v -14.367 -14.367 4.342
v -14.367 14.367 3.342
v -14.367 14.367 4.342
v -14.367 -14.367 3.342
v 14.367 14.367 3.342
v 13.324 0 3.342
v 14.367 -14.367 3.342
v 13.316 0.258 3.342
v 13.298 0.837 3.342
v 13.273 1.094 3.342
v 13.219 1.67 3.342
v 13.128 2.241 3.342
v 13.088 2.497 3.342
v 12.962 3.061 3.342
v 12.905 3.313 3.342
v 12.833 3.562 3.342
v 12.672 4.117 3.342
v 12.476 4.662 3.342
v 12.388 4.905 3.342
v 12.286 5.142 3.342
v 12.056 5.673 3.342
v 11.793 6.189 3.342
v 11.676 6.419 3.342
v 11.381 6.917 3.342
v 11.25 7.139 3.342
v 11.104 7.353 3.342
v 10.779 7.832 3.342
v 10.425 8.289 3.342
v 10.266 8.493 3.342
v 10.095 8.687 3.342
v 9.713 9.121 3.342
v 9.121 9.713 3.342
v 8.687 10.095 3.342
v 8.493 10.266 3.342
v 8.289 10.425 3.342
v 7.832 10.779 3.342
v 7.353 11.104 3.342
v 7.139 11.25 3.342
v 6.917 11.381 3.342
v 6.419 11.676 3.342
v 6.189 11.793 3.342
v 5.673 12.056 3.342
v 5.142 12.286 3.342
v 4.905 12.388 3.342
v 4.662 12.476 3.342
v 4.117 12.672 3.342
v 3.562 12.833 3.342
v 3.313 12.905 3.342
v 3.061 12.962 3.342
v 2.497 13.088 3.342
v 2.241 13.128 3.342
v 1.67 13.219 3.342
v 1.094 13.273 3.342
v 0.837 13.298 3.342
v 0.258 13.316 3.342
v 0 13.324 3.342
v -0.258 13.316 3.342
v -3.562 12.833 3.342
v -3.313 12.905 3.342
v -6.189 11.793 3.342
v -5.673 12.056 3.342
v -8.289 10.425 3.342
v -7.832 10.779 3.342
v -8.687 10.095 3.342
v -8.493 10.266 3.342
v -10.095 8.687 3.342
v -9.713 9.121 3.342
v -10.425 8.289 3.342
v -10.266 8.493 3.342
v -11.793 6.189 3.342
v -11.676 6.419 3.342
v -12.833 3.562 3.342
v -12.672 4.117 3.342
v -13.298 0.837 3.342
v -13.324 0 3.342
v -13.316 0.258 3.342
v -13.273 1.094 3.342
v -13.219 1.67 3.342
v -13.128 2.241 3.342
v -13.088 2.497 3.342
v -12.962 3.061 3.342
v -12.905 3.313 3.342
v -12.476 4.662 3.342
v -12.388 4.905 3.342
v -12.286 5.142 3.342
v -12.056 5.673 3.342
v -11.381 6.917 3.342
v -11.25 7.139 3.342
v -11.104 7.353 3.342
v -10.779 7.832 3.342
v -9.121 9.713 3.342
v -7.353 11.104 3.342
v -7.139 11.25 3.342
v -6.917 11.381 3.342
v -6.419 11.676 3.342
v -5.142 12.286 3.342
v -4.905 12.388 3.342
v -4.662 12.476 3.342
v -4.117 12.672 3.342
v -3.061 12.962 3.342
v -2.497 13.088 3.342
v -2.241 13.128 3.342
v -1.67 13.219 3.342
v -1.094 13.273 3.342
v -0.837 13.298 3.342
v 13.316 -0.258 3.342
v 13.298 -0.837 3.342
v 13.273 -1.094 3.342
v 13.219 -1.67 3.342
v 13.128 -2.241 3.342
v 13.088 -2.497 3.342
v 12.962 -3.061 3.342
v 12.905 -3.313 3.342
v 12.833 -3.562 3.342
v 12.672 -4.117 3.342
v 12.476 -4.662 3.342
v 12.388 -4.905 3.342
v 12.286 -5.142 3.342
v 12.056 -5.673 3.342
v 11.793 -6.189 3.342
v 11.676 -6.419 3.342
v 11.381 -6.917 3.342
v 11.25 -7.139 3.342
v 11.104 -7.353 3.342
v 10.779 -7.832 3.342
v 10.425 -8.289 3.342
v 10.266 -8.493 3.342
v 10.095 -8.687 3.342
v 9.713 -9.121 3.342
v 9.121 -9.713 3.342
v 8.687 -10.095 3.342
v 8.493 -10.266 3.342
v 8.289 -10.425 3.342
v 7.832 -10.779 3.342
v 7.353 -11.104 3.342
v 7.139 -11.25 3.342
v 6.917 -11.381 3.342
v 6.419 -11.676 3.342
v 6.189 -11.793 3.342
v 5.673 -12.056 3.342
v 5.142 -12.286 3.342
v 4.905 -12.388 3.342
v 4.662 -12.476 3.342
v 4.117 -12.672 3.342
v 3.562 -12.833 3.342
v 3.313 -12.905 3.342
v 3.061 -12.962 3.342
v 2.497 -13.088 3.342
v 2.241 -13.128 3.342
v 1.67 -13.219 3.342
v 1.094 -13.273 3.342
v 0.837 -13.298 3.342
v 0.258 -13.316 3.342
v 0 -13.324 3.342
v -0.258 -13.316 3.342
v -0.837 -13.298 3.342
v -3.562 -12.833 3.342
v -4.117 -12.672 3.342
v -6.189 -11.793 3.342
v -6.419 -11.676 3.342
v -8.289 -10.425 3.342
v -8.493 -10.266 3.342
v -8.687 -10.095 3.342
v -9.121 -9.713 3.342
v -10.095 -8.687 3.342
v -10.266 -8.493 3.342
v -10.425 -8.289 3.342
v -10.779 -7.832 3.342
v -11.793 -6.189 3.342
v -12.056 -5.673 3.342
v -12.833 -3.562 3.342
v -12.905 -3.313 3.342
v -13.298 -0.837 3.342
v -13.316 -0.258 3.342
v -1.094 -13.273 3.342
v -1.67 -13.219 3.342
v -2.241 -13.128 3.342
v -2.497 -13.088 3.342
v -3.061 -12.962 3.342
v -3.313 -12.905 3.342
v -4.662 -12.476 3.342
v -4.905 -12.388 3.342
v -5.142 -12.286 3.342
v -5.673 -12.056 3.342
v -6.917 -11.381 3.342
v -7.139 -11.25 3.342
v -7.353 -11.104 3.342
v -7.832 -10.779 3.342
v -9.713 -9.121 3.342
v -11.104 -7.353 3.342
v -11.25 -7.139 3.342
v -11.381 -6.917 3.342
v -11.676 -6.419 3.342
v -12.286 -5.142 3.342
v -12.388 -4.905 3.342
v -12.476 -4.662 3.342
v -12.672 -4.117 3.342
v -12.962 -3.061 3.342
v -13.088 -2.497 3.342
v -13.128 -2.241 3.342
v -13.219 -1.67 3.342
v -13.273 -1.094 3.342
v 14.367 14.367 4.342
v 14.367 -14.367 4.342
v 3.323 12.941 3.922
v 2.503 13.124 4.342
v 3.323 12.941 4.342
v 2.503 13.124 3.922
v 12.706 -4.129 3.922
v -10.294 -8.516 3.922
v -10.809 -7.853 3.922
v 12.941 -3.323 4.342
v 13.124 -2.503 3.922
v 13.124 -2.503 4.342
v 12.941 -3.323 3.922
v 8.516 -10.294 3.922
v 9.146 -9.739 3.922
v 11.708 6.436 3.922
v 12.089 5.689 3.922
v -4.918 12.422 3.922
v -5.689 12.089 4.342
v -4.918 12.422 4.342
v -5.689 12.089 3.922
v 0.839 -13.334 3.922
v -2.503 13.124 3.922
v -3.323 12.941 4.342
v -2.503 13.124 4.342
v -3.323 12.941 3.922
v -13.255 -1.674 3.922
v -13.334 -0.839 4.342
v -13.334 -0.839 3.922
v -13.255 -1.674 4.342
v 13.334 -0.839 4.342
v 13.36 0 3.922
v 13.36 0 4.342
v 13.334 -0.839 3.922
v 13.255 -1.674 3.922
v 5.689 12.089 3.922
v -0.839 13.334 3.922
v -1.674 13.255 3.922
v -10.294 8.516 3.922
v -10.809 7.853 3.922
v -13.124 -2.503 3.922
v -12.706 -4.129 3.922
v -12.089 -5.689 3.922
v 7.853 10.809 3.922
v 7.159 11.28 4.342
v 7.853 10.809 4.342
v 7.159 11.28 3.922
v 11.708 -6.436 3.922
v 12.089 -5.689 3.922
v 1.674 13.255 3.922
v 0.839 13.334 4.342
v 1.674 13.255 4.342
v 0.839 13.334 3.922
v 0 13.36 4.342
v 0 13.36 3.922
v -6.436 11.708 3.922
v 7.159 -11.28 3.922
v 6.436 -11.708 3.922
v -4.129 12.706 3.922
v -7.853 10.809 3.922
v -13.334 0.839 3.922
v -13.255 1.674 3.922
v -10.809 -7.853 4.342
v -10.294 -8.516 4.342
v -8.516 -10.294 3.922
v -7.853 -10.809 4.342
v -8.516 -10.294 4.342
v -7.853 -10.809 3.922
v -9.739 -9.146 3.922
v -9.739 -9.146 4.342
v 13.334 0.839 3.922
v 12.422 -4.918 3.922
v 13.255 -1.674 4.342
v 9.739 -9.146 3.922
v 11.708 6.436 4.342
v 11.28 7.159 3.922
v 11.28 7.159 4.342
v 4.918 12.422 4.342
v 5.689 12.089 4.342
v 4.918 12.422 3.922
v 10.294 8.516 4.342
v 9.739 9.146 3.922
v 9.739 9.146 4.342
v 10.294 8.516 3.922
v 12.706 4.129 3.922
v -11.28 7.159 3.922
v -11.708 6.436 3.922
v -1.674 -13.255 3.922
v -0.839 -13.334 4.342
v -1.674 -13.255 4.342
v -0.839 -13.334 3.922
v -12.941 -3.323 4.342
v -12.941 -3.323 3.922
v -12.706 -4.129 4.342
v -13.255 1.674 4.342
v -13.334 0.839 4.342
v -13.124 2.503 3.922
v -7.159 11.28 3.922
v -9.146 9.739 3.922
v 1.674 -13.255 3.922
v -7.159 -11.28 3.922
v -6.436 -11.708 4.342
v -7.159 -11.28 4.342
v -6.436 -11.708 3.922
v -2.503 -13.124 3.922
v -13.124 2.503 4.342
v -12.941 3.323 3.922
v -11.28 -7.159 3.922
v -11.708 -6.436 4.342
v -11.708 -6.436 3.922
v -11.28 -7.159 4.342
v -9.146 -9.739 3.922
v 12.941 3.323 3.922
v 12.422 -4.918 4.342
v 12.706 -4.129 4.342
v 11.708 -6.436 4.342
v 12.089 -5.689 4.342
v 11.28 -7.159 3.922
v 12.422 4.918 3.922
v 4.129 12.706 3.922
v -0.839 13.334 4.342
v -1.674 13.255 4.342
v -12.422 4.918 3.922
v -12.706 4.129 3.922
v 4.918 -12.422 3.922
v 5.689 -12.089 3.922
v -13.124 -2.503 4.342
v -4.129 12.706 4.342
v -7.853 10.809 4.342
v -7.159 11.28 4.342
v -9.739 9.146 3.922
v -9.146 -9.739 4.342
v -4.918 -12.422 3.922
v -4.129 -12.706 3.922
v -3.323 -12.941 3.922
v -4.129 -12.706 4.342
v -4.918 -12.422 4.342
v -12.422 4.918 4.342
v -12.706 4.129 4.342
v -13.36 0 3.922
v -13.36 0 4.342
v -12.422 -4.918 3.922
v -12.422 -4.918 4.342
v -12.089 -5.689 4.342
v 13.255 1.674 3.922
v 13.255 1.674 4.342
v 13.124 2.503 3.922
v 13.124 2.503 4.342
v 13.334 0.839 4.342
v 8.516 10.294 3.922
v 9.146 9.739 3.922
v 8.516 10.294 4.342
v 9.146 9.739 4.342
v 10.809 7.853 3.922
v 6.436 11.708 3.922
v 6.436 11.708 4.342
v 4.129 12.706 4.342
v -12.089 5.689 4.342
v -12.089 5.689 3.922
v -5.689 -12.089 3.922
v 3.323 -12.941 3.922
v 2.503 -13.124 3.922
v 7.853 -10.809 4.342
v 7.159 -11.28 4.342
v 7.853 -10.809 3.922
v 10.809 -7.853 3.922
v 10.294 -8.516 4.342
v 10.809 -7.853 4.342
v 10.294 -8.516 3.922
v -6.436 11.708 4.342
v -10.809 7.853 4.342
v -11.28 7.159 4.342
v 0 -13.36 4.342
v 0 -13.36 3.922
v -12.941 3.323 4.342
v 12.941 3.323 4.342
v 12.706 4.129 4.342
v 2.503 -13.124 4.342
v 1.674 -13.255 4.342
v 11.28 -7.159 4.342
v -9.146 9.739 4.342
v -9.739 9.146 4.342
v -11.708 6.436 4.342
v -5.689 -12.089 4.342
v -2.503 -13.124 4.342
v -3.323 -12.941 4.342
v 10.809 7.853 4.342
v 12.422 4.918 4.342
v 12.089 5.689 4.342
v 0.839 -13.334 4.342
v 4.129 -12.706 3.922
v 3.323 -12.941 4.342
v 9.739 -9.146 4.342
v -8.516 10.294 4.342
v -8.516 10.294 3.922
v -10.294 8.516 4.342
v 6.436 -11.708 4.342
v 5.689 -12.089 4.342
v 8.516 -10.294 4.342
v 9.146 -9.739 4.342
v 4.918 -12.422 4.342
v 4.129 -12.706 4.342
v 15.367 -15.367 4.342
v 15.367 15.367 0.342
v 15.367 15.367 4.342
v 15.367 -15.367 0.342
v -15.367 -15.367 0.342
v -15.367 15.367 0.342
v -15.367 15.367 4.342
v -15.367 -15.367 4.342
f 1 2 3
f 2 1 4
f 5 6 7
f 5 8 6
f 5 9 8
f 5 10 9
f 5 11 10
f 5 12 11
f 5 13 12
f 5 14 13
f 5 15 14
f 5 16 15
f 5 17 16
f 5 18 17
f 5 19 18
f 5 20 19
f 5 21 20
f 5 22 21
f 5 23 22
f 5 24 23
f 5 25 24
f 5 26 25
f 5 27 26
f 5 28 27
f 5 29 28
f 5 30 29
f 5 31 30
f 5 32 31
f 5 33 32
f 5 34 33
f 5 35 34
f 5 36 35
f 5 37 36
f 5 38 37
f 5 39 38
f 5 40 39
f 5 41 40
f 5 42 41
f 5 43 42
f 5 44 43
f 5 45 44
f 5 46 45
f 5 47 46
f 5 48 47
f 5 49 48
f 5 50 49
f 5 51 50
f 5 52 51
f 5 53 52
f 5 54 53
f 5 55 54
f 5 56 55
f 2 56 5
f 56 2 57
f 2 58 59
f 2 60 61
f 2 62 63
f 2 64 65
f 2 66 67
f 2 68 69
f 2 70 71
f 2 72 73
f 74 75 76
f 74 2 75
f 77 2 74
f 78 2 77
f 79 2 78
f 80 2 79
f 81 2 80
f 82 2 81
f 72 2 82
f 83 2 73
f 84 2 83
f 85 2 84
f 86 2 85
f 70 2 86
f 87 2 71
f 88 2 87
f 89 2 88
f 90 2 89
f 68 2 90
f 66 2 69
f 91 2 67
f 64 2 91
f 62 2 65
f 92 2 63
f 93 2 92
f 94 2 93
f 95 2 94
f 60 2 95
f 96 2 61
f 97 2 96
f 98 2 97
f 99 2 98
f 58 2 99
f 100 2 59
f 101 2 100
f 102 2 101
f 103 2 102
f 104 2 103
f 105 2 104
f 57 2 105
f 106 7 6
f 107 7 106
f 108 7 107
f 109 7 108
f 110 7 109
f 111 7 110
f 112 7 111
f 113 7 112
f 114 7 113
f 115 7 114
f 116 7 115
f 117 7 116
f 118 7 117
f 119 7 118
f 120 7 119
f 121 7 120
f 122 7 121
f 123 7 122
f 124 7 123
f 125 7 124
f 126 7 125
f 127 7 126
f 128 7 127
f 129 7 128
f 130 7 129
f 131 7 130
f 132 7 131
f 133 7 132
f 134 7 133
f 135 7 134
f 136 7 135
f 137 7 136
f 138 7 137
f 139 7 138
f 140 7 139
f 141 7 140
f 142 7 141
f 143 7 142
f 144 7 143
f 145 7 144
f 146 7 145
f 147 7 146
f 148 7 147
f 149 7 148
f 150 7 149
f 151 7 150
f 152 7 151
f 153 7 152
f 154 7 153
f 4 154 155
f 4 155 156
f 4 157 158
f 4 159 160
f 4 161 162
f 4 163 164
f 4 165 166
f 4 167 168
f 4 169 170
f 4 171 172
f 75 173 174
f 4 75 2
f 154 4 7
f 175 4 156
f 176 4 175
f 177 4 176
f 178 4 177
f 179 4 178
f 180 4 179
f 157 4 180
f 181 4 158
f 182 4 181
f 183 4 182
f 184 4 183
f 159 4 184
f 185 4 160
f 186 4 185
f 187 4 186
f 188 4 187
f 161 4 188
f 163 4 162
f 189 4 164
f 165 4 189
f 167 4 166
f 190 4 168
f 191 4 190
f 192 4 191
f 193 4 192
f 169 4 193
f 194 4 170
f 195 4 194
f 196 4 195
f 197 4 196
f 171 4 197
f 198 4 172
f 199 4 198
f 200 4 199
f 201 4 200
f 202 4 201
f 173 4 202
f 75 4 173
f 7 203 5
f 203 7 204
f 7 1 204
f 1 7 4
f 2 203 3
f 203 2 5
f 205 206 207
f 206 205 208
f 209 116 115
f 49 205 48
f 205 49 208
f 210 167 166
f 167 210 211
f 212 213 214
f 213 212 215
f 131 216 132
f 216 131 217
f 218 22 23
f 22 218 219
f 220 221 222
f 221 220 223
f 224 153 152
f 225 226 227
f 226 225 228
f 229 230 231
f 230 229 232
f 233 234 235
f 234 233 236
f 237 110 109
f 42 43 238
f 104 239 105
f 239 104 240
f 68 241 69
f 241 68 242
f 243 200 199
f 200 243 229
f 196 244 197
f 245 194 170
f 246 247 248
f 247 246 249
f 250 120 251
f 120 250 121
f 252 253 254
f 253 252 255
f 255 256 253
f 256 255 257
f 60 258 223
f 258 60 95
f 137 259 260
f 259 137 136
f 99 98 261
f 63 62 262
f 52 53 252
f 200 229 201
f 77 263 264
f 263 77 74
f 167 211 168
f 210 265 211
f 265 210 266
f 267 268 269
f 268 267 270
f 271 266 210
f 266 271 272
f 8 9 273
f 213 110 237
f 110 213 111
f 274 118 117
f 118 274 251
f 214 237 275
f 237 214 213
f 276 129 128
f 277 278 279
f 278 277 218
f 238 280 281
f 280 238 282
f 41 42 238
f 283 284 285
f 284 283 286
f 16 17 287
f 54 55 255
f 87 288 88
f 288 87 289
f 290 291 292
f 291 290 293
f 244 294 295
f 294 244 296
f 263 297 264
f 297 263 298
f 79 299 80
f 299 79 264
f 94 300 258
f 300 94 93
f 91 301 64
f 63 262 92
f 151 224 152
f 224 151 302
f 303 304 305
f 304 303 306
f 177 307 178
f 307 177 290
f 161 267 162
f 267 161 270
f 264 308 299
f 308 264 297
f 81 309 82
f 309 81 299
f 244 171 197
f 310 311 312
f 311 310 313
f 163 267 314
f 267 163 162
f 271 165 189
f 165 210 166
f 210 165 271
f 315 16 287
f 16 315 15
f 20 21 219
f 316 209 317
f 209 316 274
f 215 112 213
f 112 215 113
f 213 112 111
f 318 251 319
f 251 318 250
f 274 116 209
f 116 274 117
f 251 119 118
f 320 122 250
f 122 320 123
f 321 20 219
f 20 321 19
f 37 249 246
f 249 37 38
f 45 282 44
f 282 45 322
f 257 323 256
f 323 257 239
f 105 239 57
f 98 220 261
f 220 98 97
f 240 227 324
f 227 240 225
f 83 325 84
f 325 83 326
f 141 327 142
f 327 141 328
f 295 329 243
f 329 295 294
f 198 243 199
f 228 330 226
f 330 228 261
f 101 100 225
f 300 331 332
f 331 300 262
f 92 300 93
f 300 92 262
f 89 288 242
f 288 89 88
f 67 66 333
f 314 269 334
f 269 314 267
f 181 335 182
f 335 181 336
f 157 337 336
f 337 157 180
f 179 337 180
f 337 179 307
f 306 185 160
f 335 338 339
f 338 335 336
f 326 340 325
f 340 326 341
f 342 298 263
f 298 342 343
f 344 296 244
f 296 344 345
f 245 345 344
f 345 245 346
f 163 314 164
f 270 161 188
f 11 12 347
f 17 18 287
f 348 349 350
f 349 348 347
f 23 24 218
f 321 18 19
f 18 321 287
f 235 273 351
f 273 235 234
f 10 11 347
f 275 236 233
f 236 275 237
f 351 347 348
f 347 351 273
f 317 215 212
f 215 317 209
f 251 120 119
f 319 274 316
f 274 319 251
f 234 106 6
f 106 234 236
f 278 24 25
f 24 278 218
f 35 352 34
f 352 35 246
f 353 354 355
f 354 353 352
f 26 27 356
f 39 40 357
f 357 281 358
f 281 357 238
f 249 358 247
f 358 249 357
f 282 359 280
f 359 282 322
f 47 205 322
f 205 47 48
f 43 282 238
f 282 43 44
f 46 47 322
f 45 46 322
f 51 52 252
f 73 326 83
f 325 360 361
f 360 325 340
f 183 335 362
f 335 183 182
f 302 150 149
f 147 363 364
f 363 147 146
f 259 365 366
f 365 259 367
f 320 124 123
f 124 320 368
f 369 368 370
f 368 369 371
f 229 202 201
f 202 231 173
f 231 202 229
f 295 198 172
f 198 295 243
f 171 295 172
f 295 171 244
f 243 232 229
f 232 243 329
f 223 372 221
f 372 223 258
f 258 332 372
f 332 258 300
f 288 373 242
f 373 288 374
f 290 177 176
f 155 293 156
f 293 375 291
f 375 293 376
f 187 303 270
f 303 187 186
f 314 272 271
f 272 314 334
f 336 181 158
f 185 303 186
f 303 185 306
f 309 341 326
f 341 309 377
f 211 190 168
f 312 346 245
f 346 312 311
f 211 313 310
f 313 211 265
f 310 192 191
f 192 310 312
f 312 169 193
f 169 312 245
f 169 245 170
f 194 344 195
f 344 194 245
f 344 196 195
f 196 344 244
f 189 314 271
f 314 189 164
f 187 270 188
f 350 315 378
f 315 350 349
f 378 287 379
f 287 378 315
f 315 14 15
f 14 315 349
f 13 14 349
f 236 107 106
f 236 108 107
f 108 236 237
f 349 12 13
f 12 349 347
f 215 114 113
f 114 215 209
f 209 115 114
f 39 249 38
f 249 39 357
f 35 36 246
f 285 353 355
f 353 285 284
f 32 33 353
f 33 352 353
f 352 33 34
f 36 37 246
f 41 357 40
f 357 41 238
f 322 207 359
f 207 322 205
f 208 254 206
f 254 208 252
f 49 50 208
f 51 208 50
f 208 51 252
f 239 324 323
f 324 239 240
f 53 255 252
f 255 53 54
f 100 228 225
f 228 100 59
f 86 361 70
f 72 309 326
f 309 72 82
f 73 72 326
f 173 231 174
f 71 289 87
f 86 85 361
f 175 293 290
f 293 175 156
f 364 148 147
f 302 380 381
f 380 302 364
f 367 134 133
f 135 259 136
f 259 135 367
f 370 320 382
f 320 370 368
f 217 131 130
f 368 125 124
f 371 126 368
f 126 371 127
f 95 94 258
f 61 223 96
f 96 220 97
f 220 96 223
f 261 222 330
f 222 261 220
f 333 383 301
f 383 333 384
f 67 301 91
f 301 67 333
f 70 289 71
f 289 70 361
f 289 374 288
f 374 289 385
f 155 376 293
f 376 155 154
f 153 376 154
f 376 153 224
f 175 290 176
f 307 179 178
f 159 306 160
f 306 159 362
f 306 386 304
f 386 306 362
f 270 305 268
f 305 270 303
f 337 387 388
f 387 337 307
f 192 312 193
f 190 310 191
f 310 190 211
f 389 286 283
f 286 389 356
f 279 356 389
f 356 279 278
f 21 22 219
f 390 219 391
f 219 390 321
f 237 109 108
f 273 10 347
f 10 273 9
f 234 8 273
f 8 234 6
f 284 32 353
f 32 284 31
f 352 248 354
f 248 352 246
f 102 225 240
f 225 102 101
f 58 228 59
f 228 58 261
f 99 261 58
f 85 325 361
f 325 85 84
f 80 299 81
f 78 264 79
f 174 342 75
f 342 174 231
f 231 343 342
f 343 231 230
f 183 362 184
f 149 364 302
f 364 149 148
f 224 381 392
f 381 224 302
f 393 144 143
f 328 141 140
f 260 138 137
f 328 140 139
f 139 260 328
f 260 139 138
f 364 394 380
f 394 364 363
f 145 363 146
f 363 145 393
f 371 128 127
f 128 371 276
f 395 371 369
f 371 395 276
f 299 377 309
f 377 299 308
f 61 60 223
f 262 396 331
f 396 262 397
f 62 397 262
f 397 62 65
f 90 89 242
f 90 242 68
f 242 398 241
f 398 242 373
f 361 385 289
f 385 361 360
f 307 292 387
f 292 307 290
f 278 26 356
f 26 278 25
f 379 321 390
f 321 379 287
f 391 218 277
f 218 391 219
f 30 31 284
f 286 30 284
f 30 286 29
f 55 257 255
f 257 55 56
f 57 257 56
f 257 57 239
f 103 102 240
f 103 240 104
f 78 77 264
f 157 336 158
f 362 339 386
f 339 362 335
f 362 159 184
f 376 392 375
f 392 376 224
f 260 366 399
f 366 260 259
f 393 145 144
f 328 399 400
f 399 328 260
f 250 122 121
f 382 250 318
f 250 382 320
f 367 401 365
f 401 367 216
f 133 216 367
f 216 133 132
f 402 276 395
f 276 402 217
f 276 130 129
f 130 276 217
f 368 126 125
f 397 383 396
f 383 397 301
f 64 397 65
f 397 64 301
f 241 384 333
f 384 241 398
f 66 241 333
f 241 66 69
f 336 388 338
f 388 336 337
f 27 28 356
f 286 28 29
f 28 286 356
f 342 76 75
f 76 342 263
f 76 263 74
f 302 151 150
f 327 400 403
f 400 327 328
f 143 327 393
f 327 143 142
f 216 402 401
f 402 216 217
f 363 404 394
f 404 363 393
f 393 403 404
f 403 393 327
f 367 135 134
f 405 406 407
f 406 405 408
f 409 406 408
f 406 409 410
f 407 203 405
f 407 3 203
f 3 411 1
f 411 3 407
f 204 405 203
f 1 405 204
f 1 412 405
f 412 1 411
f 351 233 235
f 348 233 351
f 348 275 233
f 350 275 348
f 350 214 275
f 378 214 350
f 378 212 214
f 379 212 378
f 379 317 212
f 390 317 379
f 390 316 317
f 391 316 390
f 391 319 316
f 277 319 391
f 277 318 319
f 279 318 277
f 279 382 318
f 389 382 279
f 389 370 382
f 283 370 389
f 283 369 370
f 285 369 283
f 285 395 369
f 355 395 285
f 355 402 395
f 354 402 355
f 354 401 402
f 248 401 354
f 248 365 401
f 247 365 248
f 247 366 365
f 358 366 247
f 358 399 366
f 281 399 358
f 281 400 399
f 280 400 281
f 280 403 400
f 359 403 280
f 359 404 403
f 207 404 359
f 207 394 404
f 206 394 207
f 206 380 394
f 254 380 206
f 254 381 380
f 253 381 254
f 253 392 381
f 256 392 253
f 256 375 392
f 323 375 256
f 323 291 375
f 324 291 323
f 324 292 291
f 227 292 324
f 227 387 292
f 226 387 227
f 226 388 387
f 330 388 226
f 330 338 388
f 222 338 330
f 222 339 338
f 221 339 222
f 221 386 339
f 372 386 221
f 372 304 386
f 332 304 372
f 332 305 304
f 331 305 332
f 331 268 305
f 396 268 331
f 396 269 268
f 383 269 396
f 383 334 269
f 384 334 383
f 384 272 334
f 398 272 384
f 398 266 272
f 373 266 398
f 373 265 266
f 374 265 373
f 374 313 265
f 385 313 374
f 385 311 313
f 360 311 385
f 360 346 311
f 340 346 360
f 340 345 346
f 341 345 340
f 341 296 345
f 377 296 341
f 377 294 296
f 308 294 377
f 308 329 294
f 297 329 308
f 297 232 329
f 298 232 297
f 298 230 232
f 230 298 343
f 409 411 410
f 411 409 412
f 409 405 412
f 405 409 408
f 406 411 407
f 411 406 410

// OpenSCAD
//This script makes a lid for a half sphere depression in a cube - to be used for reactionware testing
// volume sphere is 4/3*pi*r^3 so volume of half sphere=(3*x/(4*3.14))^(1/3)
// area is 4*pi*r^2
//fluid in mL , 1mL=1000mm^3

//Defines the mL of fluid
x=10; 


a=10*pow(3/4*x/3.14, 0.3333);

module reactor()
{
difference (){
#translate([-a-1,-a-1,-1])cube([2*a+2,2*a+2,a+2]);
sphere(r=a, $fn=100);
}
}

module revreactor(){
rotate([0,180,00])reactor();
}


module lid(){ //simple square lid
difference(){
#translate([-a-2,-a-2,0])cube([2*a+4,2*a+4,4]);
revreactor();
}
}

rotate([180,0,0])translate([0,0,-a/4-1])lid();
